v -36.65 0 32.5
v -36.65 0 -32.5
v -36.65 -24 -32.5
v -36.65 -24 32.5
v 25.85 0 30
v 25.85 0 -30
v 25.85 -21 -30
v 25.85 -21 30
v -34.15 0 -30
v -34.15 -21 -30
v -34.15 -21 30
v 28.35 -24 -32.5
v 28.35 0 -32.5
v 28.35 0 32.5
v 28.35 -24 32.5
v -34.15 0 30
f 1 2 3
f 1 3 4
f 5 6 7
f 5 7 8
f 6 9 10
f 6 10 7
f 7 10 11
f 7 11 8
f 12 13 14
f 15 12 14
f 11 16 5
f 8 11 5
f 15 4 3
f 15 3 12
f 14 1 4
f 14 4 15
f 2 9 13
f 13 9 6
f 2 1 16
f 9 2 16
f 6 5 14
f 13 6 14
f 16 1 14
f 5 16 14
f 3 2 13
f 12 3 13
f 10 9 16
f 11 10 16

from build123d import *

# Parameters (mm, degrees)
F0_W     = 65
F0_H     = 65
F0_W_2   = 60
F0_H_2   = 60
F1_DEPTH = 24
F2_DEPTH = 21


with BuildPart() as f1:
    # F0 (on Front) → F1 (new body)
    with BuildSketch(Plane.XZ):
        with Locations((-4.1498354938, 0)):
            Rectangle(F0_W, F0_H)
        with Locations((-4.1498354938, 0)):
            Rectangle(F0_W_2, F0_H_2, mode=Mode.SUBTRACT)
        with Locations((-4.1498354938, 0)):
            Rectangle(F0_W_2, F0_H_2)
    extrude(amount=F1_DEPTH)

    # F0 (on Front) → F2 (cut)
    with BuildSketch(Plane.XZ):
        with Locations((-4.1498354938, 0)):
            Rectangle(F0_W_2, F0_H_2)
    extrude(amount=F2_DEPTH, mode=Mode.SUBTRACT)


solid = f1.part
